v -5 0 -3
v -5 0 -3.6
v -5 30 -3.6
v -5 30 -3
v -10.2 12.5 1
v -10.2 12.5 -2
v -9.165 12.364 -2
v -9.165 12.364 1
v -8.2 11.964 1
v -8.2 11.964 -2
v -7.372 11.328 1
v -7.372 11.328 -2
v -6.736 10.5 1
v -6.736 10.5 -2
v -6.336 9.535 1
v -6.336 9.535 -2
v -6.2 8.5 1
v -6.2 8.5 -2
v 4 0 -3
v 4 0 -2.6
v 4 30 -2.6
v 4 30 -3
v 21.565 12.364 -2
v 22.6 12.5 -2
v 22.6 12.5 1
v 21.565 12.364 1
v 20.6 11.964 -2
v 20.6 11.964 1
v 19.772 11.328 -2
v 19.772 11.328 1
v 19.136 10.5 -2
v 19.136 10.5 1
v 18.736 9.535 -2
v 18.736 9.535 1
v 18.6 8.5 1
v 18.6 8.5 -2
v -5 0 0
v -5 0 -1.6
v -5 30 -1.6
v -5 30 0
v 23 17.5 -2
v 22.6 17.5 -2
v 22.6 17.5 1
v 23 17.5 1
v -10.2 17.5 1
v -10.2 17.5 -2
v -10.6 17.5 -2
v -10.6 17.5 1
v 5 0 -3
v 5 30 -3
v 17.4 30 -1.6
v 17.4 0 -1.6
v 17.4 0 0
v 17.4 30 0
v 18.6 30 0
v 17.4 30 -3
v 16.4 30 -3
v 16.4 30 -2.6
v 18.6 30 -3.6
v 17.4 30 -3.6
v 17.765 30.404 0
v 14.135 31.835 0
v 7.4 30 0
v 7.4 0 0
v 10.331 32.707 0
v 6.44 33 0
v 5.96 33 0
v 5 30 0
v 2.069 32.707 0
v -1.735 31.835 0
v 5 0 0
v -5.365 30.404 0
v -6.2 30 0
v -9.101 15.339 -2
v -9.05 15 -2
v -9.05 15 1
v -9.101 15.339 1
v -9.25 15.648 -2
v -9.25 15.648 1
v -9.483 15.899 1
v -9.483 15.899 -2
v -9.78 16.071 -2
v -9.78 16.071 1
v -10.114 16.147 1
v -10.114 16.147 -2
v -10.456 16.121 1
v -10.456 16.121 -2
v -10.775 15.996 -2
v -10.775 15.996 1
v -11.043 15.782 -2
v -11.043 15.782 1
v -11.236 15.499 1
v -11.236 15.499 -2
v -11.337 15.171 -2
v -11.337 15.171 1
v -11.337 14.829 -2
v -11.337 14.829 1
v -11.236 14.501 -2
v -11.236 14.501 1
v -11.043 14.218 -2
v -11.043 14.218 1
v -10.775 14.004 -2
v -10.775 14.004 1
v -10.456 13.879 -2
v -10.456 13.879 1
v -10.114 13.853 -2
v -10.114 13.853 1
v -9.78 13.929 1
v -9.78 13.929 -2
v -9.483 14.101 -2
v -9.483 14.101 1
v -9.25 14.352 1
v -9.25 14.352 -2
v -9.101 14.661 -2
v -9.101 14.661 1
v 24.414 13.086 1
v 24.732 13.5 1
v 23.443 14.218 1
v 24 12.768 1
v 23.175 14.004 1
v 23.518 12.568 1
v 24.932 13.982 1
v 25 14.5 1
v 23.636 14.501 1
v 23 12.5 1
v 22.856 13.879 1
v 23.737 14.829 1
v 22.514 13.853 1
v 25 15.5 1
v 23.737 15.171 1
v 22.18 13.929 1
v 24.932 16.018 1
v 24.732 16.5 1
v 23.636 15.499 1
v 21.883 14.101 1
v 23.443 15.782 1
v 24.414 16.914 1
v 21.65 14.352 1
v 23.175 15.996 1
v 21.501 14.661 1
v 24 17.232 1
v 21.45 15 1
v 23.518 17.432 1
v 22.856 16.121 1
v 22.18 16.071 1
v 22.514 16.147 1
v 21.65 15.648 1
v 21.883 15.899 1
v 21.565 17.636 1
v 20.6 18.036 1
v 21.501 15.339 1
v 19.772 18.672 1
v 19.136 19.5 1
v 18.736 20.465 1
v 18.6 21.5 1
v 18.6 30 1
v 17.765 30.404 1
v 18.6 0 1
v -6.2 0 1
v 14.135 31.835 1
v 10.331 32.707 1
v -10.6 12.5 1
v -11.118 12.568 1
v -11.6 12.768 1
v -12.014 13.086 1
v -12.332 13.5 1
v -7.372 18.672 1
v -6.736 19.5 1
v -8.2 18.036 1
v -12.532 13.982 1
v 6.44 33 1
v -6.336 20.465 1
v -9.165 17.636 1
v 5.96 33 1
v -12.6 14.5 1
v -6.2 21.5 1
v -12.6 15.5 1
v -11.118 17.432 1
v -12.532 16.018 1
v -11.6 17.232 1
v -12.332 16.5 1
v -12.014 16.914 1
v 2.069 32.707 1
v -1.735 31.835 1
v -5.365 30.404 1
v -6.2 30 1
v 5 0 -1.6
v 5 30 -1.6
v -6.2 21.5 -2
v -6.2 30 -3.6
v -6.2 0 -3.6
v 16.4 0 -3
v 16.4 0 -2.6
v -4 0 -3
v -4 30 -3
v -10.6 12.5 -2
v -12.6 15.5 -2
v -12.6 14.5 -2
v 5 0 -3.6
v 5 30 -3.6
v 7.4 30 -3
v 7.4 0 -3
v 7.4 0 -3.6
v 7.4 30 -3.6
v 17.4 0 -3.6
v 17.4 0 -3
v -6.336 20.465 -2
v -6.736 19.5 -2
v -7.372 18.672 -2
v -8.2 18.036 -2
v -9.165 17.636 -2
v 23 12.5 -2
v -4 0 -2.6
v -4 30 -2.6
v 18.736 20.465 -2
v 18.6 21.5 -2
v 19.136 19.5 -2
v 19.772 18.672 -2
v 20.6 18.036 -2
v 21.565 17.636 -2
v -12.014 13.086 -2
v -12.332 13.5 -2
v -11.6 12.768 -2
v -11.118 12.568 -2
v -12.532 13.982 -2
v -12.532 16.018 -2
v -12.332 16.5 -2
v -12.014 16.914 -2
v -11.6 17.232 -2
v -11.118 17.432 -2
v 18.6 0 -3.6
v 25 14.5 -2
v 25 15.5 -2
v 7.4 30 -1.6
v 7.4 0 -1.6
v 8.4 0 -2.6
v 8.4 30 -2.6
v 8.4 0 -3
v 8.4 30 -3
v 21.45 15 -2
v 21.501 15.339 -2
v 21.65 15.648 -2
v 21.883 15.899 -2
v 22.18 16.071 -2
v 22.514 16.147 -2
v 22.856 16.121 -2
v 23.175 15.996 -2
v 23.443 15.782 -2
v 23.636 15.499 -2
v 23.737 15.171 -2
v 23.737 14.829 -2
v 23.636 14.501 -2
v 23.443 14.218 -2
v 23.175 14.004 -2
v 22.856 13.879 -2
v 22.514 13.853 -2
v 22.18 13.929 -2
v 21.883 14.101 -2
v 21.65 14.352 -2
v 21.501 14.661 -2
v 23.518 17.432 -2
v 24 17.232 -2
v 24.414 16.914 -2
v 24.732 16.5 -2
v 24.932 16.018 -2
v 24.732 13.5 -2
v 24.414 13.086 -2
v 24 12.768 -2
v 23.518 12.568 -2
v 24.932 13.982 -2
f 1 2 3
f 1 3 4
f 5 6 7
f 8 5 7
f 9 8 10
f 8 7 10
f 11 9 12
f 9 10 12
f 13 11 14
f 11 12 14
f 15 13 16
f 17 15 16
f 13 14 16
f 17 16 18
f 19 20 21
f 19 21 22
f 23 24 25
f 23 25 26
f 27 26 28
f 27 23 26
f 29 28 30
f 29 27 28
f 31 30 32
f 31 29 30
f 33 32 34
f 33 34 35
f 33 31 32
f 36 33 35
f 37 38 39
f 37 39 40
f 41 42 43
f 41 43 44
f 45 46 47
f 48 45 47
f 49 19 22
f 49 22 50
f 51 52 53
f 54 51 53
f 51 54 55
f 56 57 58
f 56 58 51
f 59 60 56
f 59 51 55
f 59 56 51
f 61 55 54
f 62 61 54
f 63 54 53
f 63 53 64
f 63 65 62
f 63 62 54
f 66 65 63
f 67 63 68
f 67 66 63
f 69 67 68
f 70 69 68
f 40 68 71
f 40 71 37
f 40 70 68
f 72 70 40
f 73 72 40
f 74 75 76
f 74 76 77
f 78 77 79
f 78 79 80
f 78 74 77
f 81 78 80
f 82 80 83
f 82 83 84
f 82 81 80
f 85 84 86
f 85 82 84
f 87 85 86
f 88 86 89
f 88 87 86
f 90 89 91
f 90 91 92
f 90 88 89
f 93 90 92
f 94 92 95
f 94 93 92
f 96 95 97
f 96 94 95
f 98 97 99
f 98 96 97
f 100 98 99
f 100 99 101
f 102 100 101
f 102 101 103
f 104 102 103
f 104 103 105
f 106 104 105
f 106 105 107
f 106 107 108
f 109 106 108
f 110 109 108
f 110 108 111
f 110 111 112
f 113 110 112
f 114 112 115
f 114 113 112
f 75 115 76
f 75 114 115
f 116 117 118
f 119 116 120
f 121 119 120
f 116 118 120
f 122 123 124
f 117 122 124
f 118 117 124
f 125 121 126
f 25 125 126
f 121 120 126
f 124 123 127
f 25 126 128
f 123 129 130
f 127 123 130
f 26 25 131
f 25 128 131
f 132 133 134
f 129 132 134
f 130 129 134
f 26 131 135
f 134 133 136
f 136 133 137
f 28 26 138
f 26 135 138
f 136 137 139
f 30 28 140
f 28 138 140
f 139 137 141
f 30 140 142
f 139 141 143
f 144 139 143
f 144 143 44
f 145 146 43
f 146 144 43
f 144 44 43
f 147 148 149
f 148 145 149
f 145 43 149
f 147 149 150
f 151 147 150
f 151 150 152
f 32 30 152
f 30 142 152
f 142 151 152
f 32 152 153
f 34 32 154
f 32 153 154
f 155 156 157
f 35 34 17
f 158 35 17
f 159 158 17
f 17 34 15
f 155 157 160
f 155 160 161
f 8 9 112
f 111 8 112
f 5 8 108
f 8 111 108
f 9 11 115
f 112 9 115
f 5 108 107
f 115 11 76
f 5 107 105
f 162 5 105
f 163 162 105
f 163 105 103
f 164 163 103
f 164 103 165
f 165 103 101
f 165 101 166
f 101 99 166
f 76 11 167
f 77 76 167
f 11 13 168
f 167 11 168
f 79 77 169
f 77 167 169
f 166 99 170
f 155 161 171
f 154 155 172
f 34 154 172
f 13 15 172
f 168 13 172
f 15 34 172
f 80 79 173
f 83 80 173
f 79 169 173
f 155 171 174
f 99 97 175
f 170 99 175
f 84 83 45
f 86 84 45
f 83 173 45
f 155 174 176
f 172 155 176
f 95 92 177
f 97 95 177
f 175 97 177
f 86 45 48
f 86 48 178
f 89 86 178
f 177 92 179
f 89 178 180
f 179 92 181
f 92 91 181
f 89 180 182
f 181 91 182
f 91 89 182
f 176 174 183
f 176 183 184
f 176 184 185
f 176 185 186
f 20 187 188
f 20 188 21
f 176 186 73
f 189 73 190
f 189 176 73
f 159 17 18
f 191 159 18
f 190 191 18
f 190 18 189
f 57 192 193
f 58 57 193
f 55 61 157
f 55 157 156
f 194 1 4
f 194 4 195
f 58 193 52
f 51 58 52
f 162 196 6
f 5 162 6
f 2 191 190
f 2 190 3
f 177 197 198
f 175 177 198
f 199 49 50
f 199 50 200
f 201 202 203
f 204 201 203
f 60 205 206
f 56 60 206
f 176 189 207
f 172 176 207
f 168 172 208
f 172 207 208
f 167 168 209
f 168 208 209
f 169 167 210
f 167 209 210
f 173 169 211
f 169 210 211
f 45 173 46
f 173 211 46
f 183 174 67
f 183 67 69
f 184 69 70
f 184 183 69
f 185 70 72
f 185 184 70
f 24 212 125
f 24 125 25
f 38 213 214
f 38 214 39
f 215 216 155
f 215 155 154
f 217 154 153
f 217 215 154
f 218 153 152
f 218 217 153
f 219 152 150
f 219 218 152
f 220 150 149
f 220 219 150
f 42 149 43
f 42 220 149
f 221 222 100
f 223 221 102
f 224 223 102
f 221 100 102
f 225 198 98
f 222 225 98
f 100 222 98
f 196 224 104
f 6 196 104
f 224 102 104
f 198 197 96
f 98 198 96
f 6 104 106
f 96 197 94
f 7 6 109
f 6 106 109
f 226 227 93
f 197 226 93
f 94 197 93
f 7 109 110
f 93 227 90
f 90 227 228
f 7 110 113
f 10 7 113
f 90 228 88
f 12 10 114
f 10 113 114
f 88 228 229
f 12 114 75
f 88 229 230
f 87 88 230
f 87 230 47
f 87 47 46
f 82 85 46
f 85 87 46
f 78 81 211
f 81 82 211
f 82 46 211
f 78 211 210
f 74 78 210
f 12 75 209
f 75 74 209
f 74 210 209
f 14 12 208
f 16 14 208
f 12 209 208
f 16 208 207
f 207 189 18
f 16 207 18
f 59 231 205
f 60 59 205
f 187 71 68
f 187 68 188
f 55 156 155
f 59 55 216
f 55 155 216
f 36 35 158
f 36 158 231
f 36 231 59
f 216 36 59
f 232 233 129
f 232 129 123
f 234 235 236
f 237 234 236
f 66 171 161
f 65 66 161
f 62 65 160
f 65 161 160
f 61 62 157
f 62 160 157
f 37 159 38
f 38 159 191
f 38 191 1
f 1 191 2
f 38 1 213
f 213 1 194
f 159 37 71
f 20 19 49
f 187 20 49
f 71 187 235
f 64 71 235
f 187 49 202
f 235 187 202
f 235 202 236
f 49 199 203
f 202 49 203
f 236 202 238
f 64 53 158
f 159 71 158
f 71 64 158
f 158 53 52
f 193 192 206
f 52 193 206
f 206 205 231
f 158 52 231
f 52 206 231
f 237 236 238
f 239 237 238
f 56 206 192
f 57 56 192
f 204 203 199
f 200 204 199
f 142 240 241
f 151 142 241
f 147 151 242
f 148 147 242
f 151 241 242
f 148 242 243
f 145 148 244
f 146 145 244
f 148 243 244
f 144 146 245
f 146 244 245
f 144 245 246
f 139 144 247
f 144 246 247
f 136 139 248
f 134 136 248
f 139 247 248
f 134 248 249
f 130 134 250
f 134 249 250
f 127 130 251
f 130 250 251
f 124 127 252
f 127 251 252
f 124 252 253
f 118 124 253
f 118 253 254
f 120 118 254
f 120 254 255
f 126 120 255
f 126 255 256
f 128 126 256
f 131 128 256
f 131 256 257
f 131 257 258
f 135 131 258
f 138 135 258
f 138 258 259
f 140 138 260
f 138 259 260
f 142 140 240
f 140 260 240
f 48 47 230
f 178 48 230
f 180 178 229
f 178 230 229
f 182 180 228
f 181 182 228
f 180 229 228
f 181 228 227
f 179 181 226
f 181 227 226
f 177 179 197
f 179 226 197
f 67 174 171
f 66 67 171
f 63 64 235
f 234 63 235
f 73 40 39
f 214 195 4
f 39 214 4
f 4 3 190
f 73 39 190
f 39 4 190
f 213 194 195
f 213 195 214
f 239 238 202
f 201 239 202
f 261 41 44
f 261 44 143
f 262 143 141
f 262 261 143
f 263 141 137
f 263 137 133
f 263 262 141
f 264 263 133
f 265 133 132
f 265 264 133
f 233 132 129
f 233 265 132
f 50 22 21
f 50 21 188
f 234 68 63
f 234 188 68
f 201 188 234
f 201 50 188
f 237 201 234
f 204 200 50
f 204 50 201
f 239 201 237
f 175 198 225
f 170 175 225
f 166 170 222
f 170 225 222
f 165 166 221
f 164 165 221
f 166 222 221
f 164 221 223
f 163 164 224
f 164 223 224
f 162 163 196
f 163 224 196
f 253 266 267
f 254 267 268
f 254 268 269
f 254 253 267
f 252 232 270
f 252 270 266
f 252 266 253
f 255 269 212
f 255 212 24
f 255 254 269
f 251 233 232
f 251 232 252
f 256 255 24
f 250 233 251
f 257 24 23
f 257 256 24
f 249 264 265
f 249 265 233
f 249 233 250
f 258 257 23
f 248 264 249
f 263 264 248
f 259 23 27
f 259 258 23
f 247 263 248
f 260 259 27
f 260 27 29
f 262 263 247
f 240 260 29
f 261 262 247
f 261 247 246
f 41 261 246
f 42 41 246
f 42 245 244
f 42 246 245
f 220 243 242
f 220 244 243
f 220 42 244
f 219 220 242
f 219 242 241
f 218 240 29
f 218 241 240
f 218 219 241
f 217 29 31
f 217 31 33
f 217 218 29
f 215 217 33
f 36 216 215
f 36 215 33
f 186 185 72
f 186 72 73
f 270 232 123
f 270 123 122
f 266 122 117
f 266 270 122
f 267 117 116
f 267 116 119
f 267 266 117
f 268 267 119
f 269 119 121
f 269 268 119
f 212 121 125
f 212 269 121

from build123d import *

# Parameters (mm, degrees)
P_IDAT_VYSUNUT_M1_DEPTH = 30
P_IDAT_START            = -2
SKICA2_R                = 1.15
P_IDAT_VYSUNUT_M2_DEPTH = 3
P_IDAT_VYSUNUT_M3_DEPTH = 1


with BuildPart() as part:
    # Skica1 → Přidat vysunutím1 (new body)
    with BuildSketch(Plane(origin=(0, 0, 0), x_dir=(1, 0, 0), z_dir=(0, 1, 0))):
        Polygon((-5, 0), (5, 0), (5, 1.6), (4, 2.6), (4, 3), (5, 3), (5, 3.6), (6.2, 3.6), (6.2, -1), (-6.2, -1), (-6.2, 3.6), (-5, 3.6), (-5, 3), (-4, 3), (-4, 2.6), (-5, 1.6), align=None)
    p_idat_vysunut_m1 = extrude(amount=P_IDAT_VYSUNUT_M1_DEPTH)

    # Skica2 → Přidat vysunutím2 (add)
    with BuildSketch(Plane.XY.offset(P_IDAT_START)):
        with BuildLine():
            Line((-10.2, 17.5), (-10.6, 17.5))
            ThreePointArc((-10.6, 17.5), (-12.014213562, 16.914213562), (-12.6, 15.5))
            Line((-12.6, 15.5), (-12.6, 14.5))
            ThreePointArc((-12.6, 14.5), (-12.014213562, 13.085786438), (-10.6, 12.5))
            Line((-10.6, 12.5), (-10.2, 12.5))
            ThreePointArc((-10.2, 12.5), (-7.371572875, 11.328427125), (-6.2, 8.5))
            Line((-6.2, 8.5), (-6.2, 21.5))
            ThreePointArc((-6.2, 21.5), (-7.371572875, 18.671572875), (-10.2, 17.5))
        make_face()
        with Locations((-10.2, 15)):
            Circle(SKICA2_R, mode=Mode.SUBTRACT)
    p_idat_vysunut_m2 = extrude(amount=P_IDAT_VYSUNUT_M2_DEPTH)

    # Skica3 → Přidat vysunutím3 (add)
    with BuildSketch(Plane.XY.offset(1)):
        with BuildLine():
            Line((-6.2, 30), (6.2, 30))
            Line((6.2, 30), (6.2, 33))
            Line((6.2, 33), (5.959807907, 33))
            ThreePointArc((5.959807907, 33), (0.150662271, 32.3427273), (-5.364776224, 30.404140537))
            Line((-5.364776224, 30.404140537), (-6.2, 30))
        make_face()
    p_idat_vysunut_m3 = extrude(amount=-P_IDAT_VYSUNUT_M3_DEPTH)

    # Zrcadlit2: Přidat vysunutím1, Přidat vysunutím2, Přidat vysunutím3 across plane
    add(p_idat_vysunut_m1.mirror(Plane(origin=(6.2, 30, -3.6), x_dir=(0, 0, 1), z_dir=(-1, 0, 0))))
    add(p_idat_vysunut_m2.mirror(Plane(origin=(6.2, 30, -3.6), x_dir=(0, 0, 1), z_dir=(-1, 0, 0))))
    add(p_idat_vysunut_m3.mirror(Plane(origin=(6.2, 30, -3.6), x_dir=(0, 0, 1), z_dir=(-1, 0, 0))))


solid = part.part
